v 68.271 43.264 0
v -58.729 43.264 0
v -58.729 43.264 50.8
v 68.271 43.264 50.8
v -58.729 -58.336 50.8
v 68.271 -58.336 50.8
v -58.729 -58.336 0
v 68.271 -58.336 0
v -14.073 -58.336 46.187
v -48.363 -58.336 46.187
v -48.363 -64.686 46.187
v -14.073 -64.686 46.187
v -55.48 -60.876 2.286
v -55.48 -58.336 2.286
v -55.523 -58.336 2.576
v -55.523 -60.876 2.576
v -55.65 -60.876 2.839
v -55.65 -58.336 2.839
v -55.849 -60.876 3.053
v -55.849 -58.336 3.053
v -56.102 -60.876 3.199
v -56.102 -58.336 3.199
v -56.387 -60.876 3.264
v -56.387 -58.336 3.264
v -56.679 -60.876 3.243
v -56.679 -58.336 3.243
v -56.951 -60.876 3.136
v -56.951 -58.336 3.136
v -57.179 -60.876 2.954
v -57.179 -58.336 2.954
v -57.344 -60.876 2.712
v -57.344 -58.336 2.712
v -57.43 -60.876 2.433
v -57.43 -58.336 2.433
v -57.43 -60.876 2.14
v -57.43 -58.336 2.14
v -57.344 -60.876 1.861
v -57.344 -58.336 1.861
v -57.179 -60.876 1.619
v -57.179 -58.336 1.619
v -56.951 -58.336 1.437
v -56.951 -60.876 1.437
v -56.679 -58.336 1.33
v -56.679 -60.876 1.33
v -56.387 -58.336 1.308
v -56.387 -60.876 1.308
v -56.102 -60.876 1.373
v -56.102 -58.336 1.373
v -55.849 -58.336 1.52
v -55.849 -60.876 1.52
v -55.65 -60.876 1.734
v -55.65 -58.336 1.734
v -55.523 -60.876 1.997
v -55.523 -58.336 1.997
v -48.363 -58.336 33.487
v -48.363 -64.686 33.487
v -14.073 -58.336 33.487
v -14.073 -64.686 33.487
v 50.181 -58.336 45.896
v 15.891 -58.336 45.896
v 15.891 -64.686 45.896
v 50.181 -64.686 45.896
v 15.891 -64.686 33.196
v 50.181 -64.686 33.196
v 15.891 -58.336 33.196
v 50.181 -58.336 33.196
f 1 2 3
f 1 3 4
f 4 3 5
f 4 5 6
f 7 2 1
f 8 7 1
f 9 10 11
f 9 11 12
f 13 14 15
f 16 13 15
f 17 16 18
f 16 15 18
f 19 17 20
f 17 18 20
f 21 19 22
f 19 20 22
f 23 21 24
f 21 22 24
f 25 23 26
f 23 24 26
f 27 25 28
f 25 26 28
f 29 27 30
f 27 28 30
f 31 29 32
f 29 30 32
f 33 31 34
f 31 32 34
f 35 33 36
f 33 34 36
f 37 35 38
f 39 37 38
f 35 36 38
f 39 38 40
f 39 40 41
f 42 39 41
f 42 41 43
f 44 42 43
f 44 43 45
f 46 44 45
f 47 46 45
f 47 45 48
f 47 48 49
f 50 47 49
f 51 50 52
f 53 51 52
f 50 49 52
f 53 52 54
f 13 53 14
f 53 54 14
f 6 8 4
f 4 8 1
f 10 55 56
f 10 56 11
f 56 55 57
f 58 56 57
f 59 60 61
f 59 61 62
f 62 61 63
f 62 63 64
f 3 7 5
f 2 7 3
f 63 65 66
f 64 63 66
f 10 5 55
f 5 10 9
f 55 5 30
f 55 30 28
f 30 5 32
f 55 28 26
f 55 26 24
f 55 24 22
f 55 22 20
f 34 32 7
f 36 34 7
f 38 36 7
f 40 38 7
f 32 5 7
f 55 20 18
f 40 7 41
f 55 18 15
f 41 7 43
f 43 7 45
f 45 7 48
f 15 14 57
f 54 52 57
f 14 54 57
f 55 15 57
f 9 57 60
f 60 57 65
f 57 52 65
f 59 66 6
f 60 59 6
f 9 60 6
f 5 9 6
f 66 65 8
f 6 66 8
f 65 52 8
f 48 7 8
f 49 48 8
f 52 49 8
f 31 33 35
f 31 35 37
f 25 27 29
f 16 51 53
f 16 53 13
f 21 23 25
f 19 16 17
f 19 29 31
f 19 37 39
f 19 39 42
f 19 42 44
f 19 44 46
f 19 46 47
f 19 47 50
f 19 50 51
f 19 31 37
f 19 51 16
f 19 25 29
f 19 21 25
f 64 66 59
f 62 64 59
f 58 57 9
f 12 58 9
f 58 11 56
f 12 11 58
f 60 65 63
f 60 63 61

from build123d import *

# Parameters (mm, degrees)
F0_W     = 127
F0_H     = 101.6
F1_DEPTH = 50.8
F2_R     = 0.980775
F3_DEPTH = 2.54
F4_W     = 34.29
F4_H     = 12.7
F5_DEPTH = 6.35
F6_W     = 34.29
F6_H     = 12.7
F7_DEPTH = 6.35


with BuildPart() as f1:
    # F0 (on Top) → F1 (new body)
    with BuildSketch(Plane.XY):
        with Locations((4.771073, -7.535568)):
            Rectangle(F0_W, F0_H)
    extrude(amount=F1_DEPTH)

    # F2 (on face) → F3 (join)
    with BuildSketch(Plane.XZ.offset(58.335568)):
        with Locations((-56.460466, 2.286465)):
            Circle(F2_R)
    extrude(amount=F3_DEPTH)

    # F4 (on face) → F5 (join)
    with BuildSketch(Plane.XZ.offset(58.335568)):
        with Locations((-31.218295, 39.836608)):
            Rectangle(F4_W, F4_H)
    extrude(amount=F5_DEPTH)

    # F6 (on face) → F7 (join)
    with BuildSketch(Plane.XZ.offset(58.335568)):
        with Locations((33.035886, 39.54613)):
            Rectangle(F6_W, F6_H)
    extrude(amount=F7_DEPTH)


solid = f1.part
